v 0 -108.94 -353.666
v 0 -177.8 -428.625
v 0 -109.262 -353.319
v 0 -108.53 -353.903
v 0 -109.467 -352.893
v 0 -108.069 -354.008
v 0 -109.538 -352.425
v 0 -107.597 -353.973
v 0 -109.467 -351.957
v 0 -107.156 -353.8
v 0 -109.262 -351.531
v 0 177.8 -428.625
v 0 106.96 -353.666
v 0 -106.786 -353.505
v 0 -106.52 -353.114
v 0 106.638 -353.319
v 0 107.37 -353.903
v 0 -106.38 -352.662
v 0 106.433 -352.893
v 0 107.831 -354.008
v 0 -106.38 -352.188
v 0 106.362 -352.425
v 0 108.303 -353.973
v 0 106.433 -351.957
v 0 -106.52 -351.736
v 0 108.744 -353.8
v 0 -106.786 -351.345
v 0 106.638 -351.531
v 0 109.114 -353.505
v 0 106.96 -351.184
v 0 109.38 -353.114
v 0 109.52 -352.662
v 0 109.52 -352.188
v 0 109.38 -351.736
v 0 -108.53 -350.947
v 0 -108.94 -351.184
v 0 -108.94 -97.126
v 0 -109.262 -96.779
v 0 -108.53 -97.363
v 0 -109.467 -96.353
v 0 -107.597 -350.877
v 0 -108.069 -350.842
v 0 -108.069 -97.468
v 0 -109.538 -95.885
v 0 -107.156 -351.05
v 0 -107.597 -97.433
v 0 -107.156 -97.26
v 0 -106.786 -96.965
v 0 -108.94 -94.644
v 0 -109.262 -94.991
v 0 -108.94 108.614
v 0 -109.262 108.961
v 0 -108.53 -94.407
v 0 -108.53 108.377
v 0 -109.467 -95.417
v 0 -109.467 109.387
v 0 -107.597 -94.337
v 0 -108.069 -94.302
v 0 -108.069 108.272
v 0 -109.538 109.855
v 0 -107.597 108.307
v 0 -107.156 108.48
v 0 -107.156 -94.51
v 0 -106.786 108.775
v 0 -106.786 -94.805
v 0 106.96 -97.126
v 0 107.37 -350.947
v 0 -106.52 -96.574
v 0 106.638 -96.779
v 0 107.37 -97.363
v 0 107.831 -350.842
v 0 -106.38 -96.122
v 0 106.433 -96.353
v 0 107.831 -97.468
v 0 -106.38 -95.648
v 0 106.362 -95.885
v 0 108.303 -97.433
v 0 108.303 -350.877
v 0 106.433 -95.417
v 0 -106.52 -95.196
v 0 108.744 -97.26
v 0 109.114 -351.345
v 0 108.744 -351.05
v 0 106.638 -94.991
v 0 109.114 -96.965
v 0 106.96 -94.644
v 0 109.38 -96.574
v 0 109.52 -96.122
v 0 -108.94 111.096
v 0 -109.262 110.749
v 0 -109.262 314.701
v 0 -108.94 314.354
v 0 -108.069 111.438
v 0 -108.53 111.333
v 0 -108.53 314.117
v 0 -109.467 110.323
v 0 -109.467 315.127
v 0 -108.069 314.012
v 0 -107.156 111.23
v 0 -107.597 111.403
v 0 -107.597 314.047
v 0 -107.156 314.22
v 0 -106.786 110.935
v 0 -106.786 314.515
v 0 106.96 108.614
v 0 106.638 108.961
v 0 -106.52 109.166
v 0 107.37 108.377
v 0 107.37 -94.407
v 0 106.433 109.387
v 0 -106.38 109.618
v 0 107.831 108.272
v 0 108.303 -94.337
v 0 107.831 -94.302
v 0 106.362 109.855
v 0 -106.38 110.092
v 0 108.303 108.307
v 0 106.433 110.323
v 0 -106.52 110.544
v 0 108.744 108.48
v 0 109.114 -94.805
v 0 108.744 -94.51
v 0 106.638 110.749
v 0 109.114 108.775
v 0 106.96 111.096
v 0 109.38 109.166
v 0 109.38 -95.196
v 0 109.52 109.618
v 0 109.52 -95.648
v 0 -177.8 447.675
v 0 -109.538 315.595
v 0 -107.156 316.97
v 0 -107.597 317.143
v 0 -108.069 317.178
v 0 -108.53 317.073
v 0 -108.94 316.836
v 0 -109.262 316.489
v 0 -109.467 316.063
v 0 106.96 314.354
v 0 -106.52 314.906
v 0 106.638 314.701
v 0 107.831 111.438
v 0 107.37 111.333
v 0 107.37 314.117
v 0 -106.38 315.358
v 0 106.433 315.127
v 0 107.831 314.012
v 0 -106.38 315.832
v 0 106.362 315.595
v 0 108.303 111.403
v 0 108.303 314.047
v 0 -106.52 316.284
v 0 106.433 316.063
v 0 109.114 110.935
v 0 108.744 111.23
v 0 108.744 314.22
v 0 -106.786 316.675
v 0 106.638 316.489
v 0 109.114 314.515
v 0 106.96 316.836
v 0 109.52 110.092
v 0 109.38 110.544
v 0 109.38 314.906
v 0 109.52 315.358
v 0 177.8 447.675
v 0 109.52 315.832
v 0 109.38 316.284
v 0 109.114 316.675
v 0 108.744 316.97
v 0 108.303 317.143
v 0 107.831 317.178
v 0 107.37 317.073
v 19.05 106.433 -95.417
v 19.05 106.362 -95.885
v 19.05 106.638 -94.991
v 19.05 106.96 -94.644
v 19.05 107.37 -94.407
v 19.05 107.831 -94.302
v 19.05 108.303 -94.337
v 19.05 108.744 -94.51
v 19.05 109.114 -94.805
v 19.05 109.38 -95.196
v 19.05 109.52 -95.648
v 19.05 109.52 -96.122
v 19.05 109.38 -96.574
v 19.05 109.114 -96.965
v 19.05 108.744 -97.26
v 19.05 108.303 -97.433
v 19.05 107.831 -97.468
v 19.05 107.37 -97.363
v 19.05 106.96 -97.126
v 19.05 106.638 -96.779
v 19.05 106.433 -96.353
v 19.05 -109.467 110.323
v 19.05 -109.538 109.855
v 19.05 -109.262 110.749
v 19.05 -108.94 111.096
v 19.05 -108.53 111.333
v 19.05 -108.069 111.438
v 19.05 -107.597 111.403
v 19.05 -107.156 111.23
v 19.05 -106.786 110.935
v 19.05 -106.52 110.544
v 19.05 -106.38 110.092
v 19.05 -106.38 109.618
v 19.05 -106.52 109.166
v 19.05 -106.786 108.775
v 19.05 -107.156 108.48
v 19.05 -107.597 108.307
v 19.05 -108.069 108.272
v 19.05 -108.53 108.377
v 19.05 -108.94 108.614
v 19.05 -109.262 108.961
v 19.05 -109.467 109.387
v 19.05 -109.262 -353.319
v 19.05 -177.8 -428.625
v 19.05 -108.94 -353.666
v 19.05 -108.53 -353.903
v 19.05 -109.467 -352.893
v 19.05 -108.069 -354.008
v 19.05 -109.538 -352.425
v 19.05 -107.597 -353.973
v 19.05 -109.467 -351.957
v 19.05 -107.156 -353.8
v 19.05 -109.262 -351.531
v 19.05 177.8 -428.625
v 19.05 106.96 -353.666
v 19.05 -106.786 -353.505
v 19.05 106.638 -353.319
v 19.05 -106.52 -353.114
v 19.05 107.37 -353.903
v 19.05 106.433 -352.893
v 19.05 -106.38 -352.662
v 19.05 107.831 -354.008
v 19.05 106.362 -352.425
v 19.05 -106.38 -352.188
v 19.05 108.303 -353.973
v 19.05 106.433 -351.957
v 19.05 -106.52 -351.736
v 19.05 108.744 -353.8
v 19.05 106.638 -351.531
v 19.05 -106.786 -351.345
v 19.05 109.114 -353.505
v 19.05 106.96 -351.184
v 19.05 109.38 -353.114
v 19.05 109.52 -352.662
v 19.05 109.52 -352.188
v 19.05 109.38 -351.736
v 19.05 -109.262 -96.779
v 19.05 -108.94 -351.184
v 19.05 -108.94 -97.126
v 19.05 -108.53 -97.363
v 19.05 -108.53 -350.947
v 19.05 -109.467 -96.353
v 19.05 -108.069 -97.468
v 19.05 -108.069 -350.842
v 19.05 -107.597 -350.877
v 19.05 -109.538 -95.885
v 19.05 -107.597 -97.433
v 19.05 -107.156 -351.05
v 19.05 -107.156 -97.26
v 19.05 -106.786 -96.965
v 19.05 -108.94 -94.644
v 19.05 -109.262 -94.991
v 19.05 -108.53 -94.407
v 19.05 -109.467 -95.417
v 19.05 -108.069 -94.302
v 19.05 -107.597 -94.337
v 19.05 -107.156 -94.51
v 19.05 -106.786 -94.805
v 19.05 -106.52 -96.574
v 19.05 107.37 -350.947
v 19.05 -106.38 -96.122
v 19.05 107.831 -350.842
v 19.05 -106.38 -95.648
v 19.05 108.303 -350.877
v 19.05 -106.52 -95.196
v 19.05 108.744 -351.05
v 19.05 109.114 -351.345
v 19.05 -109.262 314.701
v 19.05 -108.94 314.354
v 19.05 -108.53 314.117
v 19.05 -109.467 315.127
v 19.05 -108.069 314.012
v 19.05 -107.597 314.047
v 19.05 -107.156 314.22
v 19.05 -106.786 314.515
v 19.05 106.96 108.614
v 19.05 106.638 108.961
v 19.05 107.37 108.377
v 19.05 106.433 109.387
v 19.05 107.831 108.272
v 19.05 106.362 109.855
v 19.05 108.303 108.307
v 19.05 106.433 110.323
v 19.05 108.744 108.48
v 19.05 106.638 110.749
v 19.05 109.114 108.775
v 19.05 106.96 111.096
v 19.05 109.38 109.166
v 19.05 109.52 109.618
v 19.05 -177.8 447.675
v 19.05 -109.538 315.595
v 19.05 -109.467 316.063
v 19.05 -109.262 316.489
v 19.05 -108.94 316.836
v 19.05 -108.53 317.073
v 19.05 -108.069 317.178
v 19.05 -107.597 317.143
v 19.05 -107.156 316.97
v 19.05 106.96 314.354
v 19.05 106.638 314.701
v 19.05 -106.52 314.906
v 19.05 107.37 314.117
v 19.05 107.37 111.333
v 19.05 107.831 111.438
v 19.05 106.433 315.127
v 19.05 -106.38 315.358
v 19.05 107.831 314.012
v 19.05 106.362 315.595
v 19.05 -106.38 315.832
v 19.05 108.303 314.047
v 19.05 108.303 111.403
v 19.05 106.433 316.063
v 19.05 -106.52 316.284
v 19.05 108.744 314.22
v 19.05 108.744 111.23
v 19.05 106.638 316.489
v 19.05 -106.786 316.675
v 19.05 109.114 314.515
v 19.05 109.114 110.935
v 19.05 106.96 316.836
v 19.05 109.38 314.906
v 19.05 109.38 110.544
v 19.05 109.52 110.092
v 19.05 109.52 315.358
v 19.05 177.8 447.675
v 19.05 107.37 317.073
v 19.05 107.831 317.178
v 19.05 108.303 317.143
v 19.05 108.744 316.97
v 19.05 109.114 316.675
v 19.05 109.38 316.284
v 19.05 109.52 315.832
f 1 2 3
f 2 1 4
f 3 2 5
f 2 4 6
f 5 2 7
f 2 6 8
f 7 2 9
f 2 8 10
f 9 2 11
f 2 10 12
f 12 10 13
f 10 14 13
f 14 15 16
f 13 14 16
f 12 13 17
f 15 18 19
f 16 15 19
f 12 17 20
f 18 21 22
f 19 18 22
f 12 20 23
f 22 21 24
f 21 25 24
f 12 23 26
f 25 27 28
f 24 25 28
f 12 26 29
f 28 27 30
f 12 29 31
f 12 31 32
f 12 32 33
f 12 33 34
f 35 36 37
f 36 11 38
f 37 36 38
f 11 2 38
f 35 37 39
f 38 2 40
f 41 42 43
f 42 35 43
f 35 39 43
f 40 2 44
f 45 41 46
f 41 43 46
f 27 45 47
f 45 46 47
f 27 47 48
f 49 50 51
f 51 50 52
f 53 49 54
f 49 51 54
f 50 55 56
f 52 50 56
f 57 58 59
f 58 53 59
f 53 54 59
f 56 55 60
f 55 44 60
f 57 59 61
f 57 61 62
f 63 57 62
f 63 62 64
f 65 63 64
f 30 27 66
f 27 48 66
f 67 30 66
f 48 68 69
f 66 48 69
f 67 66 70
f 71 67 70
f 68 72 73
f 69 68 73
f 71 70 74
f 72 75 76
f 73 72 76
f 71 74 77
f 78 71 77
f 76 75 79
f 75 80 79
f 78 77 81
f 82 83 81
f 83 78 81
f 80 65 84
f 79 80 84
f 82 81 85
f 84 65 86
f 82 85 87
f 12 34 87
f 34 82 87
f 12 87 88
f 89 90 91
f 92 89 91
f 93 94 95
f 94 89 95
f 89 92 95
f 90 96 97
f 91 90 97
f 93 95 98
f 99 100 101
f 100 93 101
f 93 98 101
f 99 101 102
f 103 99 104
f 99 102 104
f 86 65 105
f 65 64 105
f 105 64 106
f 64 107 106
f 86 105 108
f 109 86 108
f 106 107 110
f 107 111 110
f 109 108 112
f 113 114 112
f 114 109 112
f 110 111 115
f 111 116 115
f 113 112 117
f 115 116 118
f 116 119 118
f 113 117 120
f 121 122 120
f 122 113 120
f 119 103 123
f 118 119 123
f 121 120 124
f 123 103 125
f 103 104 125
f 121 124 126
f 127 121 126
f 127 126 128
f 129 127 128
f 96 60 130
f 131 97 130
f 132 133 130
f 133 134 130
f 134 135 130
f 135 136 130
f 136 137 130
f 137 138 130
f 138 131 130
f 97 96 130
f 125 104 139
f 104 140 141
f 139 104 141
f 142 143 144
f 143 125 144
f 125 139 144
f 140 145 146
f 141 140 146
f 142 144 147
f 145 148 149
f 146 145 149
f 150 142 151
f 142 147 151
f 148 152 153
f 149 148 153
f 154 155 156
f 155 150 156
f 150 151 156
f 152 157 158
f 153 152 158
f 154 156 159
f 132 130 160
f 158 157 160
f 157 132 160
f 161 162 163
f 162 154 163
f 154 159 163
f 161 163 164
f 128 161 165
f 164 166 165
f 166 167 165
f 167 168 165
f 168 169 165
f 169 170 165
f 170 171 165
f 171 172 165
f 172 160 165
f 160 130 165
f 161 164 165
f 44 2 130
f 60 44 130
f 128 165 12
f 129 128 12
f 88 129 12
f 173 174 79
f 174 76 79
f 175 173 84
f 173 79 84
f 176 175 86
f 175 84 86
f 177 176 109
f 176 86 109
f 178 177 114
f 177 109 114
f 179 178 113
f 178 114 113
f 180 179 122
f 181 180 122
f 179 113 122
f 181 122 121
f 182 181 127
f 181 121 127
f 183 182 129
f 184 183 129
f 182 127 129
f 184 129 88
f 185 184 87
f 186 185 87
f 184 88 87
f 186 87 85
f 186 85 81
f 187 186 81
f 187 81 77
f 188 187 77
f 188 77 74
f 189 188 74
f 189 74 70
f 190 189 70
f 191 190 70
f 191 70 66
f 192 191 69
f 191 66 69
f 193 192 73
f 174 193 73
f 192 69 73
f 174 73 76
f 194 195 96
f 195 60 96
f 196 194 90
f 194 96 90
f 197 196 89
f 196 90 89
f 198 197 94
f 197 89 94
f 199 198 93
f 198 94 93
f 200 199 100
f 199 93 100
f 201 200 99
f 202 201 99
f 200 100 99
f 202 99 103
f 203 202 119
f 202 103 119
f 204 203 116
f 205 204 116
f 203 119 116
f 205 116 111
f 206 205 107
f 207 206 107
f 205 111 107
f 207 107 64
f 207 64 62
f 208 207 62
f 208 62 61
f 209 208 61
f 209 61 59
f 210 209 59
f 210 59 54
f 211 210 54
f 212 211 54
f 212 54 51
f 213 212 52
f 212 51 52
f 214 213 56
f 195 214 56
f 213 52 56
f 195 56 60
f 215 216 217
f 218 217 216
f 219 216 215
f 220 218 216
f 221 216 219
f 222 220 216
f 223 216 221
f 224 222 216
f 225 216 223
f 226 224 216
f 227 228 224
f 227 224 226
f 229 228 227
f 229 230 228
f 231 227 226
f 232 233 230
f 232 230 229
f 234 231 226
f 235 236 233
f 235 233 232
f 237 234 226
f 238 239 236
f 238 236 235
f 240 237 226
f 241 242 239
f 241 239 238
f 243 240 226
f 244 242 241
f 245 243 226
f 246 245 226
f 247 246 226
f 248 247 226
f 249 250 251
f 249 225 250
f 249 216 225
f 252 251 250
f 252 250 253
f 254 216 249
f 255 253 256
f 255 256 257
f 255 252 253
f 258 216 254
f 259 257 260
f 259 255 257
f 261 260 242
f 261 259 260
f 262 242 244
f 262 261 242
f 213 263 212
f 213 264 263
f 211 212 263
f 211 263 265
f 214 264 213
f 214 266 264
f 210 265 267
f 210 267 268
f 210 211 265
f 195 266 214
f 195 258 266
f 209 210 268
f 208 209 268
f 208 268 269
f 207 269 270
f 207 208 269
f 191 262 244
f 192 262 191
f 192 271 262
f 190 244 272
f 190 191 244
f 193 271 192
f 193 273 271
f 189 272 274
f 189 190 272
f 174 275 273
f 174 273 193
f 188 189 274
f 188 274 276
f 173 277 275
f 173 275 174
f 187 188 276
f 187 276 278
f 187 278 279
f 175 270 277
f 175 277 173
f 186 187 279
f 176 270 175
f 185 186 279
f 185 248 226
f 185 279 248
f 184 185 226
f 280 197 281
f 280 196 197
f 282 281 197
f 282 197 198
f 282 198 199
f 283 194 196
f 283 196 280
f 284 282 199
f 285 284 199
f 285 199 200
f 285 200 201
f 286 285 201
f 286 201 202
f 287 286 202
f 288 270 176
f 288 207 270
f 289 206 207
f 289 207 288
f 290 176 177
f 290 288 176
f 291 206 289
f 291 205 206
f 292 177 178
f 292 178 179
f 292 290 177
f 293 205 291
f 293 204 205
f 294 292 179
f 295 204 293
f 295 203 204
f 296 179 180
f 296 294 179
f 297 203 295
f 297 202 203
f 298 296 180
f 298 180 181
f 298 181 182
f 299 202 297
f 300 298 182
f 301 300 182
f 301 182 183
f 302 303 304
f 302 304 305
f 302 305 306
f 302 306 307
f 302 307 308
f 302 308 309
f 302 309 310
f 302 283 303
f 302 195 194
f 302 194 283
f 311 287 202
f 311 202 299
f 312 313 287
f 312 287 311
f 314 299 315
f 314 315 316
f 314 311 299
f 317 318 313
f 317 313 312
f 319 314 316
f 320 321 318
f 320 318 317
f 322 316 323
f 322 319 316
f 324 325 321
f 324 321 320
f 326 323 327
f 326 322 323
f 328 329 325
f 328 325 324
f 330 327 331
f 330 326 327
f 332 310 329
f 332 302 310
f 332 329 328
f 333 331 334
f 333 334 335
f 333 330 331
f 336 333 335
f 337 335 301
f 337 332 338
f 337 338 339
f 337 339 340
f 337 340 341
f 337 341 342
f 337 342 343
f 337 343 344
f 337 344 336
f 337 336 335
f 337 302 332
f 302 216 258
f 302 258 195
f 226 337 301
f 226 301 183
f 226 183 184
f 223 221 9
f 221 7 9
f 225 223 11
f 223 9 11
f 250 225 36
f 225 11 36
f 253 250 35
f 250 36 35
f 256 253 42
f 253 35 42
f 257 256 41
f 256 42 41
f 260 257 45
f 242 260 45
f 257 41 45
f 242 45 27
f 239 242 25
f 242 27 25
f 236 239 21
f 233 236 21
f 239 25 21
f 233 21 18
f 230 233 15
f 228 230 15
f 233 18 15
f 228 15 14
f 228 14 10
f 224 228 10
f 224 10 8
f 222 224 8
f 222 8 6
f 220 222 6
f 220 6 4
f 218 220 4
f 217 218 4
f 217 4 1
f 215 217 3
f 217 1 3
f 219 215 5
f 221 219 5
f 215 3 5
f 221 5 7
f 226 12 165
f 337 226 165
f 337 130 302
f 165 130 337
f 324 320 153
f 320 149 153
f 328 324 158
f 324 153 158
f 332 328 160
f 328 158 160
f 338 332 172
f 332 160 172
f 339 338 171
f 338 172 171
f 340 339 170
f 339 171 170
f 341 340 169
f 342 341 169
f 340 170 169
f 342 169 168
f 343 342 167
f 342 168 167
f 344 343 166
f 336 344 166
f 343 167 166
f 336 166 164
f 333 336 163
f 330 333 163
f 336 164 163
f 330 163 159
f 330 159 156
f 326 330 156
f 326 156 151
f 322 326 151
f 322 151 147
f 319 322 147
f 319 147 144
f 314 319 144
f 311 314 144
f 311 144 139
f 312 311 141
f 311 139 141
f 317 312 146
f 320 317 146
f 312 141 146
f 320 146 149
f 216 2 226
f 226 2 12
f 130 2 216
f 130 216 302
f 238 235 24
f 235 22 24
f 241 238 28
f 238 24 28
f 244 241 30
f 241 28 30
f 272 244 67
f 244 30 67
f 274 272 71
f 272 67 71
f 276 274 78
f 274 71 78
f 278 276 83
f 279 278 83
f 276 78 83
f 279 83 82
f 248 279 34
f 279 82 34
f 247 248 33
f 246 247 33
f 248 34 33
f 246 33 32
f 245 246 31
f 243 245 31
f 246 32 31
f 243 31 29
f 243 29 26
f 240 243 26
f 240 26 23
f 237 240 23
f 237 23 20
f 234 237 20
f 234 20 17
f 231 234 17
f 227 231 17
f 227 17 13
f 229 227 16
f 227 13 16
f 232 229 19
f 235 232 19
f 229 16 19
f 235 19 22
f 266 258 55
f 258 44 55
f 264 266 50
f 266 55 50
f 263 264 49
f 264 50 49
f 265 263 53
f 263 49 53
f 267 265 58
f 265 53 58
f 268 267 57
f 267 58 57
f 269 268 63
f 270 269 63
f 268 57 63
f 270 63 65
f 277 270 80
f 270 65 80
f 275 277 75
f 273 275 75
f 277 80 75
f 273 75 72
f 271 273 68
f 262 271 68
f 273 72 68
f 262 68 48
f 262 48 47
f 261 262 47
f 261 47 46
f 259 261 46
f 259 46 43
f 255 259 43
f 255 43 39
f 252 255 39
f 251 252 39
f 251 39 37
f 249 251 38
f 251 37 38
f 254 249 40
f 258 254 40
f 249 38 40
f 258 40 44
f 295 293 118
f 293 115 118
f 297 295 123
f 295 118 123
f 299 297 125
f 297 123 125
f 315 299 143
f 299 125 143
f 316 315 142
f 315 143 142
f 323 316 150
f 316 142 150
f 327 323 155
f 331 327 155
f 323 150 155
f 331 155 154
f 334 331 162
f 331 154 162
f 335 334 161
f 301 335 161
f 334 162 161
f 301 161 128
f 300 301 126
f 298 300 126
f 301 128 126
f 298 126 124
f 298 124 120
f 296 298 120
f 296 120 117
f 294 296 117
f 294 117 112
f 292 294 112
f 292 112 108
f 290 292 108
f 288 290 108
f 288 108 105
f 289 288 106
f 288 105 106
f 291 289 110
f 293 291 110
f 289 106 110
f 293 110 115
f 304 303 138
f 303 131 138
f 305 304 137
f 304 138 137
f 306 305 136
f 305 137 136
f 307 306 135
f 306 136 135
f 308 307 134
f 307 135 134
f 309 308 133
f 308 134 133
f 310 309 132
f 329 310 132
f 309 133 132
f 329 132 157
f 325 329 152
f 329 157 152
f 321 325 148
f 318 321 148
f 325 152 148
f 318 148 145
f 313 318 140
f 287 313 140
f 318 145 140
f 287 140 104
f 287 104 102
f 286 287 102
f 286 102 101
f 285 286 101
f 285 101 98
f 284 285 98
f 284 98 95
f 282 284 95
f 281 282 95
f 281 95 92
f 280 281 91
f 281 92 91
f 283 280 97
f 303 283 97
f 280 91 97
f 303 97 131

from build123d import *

# Parameters (mm, degrees)
F0_W     = 355.6
F0_H     = 895.35
F1_DEPTH = 19.05
F3_D     = 3.175
F3_DEPTH = 19.05
F3_TIP   = 0.9538662327
F4_DEPTH = 19.05


with BuildPart() as f1:
    # F0 (on Right) → F1 (new body)
    with BuildSketch(Plane.YZ):
        Rectangle(F0_W, F0_H)
    extrude(amount=F1_DEPTH)

    # F3
    with Locations(Plane.YZ.offset(19.05)):
        with Locations((-107.95, 315.595), (107.95, 315.595), (107.95, 109.855), (-107.95, 109.855), (-107.95, -95.885), (107.95, -95.885), (107.95, -352.425), (-107.95, -352.425)):
            Hole(F3_D / 2, depth=F3_DEPTH)
            with Locations((0, 0, -(F3_DEPTH + F3_TIP / 2))):  # 118° drill point
                Cone(0, F3_D / 2, F3_TIP, mode=Mode.SUBTRACT)

    # F4 (cut): a face of the model
    f4_faces = [f1.faces().sort_by_distance(p)[0] for p in [
        (9.525, 0, -447.675),
    ]]
    extrude(f4_faces, amount=-F4_DEPTH, mode=Mode.SUBTRACT)


solid = f1.part
